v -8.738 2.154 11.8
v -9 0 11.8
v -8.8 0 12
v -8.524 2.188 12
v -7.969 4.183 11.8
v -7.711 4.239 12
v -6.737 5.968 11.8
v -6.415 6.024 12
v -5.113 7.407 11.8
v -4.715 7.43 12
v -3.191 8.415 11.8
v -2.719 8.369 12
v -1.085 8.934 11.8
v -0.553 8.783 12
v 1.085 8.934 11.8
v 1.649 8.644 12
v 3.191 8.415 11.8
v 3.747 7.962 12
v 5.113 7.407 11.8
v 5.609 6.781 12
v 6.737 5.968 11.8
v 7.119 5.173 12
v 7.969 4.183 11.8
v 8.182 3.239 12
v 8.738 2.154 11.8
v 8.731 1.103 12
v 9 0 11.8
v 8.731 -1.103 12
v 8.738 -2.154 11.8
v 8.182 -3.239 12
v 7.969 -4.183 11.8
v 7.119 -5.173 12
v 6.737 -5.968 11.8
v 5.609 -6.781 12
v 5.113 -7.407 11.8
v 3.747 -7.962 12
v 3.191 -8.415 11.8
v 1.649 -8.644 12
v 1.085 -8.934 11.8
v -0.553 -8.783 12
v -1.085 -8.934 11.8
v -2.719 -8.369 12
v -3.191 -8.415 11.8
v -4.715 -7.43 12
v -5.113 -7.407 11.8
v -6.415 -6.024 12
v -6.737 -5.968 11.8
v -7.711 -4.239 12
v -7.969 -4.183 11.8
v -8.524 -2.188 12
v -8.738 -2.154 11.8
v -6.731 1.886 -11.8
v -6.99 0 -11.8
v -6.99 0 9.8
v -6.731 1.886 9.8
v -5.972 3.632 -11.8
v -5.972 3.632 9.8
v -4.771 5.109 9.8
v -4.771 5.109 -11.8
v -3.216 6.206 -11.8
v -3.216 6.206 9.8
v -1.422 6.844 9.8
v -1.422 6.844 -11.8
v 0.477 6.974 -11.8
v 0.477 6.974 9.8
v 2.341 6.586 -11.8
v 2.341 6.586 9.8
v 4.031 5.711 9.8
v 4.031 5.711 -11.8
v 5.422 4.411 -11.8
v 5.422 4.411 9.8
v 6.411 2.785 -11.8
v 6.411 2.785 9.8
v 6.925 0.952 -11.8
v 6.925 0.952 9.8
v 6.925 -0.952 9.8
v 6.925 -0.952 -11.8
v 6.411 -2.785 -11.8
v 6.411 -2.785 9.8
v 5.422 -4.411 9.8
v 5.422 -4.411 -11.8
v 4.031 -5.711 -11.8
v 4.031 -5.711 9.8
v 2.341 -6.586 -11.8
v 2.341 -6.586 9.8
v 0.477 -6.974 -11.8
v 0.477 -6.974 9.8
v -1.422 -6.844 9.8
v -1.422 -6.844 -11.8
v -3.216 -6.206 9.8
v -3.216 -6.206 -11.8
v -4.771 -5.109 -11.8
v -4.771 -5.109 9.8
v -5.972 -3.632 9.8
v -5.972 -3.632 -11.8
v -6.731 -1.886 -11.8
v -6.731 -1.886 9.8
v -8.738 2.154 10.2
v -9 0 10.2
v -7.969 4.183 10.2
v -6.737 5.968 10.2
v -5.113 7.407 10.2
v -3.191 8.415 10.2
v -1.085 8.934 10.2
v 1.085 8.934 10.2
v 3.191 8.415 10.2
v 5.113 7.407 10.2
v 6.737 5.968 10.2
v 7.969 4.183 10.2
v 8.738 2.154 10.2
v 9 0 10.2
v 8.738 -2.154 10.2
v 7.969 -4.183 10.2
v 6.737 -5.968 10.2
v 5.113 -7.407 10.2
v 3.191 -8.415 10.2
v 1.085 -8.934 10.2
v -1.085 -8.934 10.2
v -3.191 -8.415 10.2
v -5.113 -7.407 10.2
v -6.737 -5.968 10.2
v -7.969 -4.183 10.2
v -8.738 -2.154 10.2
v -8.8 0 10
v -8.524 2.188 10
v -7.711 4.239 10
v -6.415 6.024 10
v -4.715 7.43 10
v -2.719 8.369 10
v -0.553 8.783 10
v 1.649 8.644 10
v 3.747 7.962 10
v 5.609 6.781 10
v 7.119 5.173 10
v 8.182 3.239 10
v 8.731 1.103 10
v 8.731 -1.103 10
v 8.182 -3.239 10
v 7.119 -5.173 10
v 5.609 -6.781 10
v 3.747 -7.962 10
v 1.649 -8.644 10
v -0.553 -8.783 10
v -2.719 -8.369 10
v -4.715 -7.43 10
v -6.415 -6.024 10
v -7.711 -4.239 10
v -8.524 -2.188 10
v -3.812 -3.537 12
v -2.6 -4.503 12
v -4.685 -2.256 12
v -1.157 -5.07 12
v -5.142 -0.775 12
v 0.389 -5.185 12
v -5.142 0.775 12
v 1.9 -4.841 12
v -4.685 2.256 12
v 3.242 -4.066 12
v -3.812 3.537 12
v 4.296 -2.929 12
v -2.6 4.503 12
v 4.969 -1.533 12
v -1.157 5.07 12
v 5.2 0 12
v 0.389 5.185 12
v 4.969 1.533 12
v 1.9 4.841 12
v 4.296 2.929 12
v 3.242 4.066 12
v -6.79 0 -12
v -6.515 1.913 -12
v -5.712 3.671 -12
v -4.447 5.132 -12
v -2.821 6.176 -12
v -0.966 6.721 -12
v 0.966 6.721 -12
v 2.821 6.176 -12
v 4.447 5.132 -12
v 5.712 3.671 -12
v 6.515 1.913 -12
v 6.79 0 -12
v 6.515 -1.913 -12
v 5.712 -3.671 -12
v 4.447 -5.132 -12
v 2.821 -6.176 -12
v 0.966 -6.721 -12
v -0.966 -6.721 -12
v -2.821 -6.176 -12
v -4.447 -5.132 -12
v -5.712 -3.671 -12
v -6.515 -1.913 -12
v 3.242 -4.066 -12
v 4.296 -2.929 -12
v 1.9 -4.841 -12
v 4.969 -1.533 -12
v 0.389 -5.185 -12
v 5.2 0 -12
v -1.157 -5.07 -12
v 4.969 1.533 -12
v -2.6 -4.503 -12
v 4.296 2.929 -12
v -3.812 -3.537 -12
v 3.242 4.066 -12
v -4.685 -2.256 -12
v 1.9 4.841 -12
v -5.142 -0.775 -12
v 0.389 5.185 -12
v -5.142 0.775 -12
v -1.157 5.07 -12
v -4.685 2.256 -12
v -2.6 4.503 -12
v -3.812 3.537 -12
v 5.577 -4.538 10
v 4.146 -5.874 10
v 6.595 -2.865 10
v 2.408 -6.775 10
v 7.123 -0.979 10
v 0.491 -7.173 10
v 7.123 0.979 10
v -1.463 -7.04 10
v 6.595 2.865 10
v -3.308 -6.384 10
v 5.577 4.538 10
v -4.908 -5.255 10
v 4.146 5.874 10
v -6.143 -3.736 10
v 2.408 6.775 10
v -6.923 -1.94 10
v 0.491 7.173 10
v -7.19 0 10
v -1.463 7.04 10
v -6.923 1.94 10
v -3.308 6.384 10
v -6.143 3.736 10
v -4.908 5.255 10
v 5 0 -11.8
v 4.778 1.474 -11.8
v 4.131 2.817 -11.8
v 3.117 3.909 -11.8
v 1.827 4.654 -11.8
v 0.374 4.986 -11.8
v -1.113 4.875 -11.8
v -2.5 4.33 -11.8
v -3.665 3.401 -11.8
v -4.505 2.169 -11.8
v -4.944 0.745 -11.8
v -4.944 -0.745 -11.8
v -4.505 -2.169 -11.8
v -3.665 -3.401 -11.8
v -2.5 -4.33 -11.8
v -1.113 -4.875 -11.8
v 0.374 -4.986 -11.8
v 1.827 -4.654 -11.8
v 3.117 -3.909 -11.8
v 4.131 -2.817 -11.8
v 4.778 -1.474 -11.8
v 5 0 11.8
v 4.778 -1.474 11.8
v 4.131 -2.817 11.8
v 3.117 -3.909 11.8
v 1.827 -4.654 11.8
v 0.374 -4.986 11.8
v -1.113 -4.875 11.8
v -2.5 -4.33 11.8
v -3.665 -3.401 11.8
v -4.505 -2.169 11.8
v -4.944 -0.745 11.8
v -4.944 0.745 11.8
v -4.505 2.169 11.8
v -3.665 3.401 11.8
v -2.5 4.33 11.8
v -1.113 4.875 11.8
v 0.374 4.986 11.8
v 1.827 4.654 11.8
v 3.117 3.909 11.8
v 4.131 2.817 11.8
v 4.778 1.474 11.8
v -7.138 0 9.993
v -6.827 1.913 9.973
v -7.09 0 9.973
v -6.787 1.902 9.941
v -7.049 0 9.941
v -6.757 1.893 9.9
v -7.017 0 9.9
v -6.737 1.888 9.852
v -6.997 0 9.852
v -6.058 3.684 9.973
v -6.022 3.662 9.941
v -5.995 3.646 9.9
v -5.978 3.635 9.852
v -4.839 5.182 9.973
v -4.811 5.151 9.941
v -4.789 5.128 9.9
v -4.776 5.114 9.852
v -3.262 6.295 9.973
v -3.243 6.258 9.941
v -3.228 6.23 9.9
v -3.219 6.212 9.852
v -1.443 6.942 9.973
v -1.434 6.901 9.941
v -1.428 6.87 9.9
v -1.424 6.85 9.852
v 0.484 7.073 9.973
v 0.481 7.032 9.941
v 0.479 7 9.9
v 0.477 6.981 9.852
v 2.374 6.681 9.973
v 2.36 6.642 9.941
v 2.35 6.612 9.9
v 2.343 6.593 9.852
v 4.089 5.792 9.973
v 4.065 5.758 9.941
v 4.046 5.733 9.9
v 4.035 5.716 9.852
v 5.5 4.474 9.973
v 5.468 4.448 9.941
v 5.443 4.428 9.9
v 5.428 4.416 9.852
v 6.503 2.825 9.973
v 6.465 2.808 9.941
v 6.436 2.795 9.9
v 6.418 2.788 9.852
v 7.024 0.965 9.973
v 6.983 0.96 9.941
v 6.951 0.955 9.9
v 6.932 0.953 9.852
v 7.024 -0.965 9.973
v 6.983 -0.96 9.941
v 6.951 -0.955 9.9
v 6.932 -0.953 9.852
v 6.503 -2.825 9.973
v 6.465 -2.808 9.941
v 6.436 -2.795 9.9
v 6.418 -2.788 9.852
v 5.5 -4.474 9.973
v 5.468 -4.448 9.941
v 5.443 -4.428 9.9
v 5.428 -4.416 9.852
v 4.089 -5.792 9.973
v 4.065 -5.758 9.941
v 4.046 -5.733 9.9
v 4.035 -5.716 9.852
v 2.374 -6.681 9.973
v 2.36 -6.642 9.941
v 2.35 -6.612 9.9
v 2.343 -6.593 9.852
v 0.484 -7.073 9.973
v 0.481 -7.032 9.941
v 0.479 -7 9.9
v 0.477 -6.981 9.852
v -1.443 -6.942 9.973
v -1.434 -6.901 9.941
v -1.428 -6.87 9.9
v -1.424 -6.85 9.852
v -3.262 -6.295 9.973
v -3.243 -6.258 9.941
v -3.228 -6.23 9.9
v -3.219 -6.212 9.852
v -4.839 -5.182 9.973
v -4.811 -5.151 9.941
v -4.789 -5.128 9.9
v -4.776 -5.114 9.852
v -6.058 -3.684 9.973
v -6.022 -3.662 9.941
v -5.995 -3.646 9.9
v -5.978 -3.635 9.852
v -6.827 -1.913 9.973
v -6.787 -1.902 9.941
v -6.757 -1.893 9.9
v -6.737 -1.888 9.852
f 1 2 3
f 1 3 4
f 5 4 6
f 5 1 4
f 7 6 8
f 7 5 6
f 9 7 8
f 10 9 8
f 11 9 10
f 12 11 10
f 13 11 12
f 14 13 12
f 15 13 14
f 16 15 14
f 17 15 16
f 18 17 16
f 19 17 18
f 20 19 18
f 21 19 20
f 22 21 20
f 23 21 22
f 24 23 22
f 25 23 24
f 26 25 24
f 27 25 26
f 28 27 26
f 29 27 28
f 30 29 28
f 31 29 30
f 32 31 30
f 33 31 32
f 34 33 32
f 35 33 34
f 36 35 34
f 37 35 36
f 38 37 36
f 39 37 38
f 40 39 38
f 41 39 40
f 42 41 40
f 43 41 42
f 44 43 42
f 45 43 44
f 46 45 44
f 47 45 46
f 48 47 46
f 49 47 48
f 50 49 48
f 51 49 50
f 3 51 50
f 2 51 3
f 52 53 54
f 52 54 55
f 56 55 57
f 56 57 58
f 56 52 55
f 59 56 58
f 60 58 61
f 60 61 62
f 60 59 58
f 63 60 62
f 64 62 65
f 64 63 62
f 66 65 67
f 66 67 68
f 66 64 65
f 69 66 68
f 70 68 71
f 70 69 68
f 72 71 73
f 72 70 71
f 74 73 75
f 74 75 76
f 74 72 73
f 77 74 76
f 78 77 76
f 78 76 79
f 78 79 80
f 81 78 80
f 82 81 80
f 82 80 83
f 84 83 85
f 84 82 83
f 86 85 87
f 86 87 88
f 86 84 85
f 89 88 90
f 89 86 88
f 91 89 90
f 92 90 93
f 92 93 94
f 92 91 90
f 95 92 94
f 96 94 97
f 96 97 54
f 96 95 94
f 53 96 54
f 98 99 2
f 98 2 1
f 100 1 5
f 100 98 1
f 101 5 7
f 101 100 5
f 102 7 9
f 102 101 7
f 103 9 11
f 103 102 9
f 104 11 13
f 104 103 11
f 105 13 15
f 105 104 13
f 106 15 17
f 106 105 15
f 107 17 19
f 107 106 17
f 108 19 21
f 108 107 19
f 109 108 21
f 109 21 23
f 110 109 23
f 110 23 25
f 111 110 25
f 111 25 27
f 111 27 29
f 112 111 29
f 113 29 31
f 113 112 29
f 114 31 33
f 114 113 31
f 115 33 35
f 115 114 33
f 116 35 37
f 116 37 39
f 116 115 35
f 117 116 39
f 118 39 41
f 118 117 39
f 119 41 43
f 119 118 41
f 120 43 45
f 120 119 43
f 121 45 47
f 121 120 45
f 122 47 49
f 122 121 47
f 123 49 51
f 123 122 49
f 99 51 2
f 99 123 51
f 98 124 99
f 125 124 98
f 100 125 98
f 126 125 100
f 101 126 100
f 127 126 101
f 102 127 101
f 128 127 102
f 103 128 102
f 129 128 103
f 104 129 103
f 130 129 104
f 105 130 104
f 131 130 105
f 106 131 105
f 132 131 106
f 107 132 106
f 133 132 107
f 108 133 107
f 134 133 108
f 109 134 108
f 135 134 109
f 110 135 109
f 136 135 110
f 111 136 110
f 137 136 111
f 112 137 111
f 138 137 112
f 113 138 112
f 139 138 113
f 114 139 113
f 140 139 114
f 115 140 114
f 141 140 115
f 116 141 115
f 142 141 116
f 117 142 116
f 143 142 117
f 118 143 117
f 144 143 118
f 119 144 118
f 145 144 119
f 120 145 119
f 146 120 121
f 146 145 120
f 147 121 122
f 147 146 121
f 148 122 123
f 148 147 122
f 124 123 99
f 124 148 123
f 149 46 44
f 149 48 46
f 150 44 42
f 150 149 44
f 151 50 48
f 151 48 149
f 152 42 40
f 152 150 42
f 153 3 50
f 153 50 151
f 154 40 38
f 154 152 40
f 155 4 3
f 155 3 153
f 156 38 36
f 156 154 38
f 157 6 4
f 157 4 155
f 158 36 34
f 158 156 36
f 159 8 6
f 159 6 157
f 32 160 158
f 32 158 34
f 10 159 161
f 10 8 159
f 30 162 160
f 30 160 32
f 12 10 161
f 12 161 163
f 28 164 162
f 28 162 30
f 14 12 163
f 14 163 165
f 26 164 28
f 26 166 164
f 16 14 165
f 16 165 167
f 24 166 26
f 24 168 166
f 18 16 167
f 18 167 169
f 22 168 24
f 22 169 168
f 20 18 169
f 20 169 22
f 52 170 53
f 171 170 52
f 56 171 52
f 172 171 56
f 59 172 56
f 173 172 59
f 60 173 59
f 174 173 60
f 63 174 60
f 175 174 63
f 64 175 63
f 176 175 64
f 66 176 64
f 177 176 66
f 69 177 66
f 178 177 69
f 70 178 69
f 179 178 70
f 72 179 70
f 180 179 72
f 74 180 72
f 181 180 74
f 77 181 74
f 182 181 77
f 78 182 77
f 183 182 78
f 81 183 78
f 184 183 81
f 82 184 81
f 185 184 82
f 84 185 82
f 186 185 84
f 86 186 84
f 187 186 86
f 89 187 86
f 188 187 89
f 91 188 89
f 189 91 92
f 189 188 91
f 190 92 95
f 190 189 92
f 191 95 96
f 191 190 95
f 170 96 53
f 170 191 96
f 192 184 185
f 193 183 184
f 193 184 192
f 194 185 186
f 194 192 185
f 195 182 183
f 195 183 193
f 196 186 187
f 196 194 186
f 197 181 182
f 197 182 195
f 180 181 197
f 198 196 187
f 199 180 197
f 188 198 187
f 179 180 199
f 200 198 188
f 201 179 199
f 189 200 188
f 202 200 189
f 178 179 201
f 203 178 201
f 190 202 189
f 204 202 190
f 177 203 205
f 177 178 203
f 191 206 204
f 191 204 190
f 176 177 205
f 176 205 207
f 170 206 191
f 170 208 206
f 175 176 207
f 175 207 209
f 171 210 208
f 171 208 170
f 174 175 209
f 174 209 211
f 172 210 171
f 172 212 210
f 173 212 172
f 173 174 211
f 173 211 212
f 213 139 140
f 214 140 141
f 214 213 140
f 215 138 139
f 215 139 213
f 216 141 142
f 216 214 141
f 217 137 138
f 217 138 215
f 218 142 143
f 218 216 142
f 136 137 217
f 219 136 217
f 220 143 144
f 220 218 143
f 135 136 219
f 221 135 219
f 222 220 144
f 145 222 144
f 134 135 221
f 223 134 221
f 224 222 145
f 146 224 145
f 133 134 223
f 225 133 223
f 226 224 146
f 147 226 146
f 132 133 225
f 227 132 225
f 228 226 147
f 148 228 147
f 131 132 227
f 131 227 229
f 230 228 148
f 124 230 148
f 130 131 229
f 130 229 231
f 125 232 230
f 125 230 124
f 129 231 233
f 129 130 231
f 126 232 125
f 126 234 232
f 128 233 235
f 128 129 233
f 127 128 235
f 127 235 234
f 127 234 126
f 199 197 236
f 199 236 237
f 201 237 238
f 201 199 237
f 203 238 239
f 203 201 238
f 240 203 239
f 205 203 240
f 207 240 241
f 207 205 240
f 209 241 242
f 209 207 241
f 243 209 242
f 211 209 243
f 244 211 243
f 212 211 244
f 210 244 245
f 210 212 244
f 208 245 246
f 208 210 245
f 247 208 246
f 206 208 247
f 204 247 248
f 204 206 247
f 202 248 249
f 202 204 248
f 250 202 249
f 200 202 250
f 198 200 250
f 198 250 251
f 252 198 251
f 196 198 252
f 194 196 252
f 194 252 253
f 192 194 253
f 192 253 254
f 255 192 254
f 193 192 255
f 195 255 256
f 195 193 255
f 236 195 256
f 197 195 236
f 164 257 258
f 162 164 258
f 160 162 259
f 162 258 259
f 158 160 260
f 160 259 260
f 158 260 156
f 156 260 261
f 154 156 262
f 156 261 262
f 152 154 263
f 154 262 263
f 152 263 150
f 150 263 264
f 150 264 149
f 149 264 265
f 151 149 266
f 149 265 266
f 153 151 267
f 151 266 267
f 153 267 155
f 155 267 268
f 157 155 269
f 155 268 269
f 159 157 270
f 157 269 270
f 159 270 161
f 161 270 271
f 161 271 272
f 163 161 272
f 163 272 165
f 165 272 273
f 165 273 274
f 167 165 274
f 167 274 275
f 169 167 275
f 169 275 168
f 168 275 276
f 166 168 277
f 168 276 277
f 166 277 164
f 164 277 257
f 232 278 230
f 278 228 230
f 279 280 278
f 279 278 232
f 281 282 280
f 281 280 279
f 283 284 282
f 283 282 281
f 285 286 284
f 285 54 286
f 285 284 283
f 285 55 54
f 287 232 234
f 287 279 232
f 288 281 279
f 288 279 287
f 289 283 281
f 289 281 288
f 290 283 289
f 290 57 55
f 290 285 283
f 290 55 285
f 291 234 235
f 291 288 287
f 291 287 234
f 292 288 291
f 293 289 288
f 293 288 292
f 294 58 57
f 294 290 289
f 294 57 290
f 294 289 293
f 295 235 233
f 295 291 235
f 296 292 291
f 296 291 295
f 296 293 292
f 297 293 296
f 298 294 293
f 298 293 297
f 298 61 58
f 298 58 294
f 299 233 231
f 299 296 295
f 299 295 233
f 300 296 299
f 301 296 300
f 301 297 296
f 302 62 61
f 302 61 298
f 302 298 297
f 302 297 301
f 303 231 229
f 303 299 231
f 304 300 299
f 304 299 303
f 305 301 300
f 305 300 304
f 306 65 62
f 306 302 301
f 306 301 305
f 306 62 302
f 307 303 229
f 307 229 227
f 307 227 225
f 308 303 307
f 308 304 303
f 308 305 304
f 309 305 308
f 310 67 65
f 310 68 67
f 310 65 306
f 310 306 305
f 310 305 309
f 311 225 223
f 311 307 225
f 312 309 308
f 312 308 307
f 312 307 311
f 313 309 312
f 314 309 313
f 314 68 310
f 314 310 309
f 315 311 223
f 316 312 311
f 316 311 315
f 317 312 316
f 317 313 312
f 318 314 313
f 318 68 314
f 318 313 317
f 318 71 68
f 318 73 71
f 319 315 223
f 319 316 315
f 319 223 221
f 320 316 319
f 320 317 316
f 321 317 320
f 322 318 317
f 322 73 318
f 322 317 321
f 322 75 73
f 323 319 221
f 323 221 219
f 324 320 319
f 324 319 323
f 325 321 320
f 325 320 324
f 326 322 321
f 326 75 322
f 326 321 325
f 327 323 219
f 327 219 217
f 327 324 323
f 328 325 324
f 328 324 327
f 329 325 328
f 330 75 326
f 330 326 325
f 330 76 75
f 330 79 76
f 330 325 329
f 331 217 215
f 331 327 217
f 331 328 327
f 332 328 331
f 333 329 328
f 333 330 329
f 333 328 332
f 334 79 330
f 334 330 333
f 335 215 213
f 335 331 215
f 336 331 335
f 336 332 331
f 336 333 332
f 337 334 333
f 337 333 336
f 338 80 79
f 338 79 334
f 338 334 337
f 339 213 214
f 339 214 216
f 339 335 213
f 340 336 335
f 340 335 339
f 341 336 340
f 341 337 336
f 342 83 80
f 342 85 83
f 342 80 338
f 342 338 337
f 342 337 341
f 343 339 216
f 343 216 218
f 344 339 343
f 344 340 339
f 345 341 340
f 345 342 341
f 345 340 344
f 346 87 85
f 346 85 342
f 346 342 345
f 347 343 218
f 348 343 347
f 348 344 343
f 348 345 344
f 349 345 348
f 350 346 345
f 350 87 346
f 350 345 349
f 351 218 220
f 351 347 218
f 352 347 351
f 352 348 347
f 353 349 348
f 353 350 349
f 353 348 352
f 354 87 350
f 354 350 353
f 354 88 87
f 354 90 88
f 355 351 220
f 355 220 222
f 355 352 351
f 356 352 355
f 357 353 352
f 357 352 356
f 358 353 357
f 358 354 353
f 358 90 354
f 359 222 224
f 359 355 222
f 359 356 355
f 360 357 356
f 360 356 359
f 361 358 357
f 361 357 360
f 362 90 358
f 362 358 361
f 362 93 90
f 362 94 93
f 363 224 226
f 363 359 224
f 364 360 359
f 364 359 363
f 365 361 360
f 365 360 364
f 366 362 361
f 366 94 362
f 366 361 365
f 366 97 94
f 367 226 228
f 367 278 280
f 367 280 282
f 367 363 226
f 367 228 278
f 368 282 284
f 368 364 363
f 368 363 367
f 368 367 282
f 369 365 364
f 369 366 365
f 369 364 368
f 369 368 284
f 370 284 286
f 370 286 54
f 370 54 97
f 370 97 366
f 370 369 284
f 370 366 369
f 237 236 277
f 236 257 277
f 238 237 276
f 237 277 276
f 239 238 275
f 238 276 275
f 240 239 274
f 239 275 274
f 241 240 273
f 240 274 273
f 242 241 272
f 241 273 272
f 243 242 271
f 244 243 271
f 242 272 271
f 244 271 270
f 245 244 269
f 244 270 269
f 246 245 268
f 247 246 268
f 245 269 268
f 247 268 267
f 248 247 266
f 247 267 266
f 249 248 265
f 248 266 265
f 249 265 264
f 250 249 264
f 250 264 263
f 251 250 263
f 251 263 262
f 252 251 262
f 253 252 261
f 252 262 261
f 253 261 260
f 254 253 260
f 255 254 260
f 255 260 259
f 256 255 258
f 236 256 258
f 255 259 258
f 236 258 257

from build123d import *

# Parameters (mm, degrees)
F2_R          = 5
F3_DEPTH      = 12.001
F3_DEPTH_BACK = 25
F4_SIZE       = 0.2
F5_R          = 0.2


with BuildPart() as f1:
    # F0 (on Front) → F1 (revolve)
    with BuildSketch(Plane.XZ):
        Polygon((0, -12), (0, 12), (-9, 12), (-9, 10), (-6.99, 10), (-6.99, -12), align=None)
    revolve(axis=Axis((0, 0, -0.6447483601), (0, 0, -1)))

    # F2 (on Top) → F3 (cut, two sides)
    with BuildSketch(Plane.XY) as f3_sk:
        Circle(F2_R)
    extrude(amount=-F3_DEPTH, mode=Mode.SUBTRACT)
    extrude(f3_sk.sketch, amount=F3_DEPTH_BACK, mode=Mode.SUBTRACT)

    # F4
    f4_edges = [f1.edges().sort_by_distance(p)[0] for p in [
        (-5, 0, -12),
        (6.99, 0, -12),
        (9, 0, 10),
        (9, 0, 12),
        (-5, 0, 12),
    ]]
    chamfer(f4_edges, length=F4_SIZE)

    # F5
    f5_edges = [f1.edges().sort_by_distance(p)[0] for p in [
        (6.99, 0, 10),
    ]]
    fillet(f5_edges, radius=F5_R)


solid = f1.part
